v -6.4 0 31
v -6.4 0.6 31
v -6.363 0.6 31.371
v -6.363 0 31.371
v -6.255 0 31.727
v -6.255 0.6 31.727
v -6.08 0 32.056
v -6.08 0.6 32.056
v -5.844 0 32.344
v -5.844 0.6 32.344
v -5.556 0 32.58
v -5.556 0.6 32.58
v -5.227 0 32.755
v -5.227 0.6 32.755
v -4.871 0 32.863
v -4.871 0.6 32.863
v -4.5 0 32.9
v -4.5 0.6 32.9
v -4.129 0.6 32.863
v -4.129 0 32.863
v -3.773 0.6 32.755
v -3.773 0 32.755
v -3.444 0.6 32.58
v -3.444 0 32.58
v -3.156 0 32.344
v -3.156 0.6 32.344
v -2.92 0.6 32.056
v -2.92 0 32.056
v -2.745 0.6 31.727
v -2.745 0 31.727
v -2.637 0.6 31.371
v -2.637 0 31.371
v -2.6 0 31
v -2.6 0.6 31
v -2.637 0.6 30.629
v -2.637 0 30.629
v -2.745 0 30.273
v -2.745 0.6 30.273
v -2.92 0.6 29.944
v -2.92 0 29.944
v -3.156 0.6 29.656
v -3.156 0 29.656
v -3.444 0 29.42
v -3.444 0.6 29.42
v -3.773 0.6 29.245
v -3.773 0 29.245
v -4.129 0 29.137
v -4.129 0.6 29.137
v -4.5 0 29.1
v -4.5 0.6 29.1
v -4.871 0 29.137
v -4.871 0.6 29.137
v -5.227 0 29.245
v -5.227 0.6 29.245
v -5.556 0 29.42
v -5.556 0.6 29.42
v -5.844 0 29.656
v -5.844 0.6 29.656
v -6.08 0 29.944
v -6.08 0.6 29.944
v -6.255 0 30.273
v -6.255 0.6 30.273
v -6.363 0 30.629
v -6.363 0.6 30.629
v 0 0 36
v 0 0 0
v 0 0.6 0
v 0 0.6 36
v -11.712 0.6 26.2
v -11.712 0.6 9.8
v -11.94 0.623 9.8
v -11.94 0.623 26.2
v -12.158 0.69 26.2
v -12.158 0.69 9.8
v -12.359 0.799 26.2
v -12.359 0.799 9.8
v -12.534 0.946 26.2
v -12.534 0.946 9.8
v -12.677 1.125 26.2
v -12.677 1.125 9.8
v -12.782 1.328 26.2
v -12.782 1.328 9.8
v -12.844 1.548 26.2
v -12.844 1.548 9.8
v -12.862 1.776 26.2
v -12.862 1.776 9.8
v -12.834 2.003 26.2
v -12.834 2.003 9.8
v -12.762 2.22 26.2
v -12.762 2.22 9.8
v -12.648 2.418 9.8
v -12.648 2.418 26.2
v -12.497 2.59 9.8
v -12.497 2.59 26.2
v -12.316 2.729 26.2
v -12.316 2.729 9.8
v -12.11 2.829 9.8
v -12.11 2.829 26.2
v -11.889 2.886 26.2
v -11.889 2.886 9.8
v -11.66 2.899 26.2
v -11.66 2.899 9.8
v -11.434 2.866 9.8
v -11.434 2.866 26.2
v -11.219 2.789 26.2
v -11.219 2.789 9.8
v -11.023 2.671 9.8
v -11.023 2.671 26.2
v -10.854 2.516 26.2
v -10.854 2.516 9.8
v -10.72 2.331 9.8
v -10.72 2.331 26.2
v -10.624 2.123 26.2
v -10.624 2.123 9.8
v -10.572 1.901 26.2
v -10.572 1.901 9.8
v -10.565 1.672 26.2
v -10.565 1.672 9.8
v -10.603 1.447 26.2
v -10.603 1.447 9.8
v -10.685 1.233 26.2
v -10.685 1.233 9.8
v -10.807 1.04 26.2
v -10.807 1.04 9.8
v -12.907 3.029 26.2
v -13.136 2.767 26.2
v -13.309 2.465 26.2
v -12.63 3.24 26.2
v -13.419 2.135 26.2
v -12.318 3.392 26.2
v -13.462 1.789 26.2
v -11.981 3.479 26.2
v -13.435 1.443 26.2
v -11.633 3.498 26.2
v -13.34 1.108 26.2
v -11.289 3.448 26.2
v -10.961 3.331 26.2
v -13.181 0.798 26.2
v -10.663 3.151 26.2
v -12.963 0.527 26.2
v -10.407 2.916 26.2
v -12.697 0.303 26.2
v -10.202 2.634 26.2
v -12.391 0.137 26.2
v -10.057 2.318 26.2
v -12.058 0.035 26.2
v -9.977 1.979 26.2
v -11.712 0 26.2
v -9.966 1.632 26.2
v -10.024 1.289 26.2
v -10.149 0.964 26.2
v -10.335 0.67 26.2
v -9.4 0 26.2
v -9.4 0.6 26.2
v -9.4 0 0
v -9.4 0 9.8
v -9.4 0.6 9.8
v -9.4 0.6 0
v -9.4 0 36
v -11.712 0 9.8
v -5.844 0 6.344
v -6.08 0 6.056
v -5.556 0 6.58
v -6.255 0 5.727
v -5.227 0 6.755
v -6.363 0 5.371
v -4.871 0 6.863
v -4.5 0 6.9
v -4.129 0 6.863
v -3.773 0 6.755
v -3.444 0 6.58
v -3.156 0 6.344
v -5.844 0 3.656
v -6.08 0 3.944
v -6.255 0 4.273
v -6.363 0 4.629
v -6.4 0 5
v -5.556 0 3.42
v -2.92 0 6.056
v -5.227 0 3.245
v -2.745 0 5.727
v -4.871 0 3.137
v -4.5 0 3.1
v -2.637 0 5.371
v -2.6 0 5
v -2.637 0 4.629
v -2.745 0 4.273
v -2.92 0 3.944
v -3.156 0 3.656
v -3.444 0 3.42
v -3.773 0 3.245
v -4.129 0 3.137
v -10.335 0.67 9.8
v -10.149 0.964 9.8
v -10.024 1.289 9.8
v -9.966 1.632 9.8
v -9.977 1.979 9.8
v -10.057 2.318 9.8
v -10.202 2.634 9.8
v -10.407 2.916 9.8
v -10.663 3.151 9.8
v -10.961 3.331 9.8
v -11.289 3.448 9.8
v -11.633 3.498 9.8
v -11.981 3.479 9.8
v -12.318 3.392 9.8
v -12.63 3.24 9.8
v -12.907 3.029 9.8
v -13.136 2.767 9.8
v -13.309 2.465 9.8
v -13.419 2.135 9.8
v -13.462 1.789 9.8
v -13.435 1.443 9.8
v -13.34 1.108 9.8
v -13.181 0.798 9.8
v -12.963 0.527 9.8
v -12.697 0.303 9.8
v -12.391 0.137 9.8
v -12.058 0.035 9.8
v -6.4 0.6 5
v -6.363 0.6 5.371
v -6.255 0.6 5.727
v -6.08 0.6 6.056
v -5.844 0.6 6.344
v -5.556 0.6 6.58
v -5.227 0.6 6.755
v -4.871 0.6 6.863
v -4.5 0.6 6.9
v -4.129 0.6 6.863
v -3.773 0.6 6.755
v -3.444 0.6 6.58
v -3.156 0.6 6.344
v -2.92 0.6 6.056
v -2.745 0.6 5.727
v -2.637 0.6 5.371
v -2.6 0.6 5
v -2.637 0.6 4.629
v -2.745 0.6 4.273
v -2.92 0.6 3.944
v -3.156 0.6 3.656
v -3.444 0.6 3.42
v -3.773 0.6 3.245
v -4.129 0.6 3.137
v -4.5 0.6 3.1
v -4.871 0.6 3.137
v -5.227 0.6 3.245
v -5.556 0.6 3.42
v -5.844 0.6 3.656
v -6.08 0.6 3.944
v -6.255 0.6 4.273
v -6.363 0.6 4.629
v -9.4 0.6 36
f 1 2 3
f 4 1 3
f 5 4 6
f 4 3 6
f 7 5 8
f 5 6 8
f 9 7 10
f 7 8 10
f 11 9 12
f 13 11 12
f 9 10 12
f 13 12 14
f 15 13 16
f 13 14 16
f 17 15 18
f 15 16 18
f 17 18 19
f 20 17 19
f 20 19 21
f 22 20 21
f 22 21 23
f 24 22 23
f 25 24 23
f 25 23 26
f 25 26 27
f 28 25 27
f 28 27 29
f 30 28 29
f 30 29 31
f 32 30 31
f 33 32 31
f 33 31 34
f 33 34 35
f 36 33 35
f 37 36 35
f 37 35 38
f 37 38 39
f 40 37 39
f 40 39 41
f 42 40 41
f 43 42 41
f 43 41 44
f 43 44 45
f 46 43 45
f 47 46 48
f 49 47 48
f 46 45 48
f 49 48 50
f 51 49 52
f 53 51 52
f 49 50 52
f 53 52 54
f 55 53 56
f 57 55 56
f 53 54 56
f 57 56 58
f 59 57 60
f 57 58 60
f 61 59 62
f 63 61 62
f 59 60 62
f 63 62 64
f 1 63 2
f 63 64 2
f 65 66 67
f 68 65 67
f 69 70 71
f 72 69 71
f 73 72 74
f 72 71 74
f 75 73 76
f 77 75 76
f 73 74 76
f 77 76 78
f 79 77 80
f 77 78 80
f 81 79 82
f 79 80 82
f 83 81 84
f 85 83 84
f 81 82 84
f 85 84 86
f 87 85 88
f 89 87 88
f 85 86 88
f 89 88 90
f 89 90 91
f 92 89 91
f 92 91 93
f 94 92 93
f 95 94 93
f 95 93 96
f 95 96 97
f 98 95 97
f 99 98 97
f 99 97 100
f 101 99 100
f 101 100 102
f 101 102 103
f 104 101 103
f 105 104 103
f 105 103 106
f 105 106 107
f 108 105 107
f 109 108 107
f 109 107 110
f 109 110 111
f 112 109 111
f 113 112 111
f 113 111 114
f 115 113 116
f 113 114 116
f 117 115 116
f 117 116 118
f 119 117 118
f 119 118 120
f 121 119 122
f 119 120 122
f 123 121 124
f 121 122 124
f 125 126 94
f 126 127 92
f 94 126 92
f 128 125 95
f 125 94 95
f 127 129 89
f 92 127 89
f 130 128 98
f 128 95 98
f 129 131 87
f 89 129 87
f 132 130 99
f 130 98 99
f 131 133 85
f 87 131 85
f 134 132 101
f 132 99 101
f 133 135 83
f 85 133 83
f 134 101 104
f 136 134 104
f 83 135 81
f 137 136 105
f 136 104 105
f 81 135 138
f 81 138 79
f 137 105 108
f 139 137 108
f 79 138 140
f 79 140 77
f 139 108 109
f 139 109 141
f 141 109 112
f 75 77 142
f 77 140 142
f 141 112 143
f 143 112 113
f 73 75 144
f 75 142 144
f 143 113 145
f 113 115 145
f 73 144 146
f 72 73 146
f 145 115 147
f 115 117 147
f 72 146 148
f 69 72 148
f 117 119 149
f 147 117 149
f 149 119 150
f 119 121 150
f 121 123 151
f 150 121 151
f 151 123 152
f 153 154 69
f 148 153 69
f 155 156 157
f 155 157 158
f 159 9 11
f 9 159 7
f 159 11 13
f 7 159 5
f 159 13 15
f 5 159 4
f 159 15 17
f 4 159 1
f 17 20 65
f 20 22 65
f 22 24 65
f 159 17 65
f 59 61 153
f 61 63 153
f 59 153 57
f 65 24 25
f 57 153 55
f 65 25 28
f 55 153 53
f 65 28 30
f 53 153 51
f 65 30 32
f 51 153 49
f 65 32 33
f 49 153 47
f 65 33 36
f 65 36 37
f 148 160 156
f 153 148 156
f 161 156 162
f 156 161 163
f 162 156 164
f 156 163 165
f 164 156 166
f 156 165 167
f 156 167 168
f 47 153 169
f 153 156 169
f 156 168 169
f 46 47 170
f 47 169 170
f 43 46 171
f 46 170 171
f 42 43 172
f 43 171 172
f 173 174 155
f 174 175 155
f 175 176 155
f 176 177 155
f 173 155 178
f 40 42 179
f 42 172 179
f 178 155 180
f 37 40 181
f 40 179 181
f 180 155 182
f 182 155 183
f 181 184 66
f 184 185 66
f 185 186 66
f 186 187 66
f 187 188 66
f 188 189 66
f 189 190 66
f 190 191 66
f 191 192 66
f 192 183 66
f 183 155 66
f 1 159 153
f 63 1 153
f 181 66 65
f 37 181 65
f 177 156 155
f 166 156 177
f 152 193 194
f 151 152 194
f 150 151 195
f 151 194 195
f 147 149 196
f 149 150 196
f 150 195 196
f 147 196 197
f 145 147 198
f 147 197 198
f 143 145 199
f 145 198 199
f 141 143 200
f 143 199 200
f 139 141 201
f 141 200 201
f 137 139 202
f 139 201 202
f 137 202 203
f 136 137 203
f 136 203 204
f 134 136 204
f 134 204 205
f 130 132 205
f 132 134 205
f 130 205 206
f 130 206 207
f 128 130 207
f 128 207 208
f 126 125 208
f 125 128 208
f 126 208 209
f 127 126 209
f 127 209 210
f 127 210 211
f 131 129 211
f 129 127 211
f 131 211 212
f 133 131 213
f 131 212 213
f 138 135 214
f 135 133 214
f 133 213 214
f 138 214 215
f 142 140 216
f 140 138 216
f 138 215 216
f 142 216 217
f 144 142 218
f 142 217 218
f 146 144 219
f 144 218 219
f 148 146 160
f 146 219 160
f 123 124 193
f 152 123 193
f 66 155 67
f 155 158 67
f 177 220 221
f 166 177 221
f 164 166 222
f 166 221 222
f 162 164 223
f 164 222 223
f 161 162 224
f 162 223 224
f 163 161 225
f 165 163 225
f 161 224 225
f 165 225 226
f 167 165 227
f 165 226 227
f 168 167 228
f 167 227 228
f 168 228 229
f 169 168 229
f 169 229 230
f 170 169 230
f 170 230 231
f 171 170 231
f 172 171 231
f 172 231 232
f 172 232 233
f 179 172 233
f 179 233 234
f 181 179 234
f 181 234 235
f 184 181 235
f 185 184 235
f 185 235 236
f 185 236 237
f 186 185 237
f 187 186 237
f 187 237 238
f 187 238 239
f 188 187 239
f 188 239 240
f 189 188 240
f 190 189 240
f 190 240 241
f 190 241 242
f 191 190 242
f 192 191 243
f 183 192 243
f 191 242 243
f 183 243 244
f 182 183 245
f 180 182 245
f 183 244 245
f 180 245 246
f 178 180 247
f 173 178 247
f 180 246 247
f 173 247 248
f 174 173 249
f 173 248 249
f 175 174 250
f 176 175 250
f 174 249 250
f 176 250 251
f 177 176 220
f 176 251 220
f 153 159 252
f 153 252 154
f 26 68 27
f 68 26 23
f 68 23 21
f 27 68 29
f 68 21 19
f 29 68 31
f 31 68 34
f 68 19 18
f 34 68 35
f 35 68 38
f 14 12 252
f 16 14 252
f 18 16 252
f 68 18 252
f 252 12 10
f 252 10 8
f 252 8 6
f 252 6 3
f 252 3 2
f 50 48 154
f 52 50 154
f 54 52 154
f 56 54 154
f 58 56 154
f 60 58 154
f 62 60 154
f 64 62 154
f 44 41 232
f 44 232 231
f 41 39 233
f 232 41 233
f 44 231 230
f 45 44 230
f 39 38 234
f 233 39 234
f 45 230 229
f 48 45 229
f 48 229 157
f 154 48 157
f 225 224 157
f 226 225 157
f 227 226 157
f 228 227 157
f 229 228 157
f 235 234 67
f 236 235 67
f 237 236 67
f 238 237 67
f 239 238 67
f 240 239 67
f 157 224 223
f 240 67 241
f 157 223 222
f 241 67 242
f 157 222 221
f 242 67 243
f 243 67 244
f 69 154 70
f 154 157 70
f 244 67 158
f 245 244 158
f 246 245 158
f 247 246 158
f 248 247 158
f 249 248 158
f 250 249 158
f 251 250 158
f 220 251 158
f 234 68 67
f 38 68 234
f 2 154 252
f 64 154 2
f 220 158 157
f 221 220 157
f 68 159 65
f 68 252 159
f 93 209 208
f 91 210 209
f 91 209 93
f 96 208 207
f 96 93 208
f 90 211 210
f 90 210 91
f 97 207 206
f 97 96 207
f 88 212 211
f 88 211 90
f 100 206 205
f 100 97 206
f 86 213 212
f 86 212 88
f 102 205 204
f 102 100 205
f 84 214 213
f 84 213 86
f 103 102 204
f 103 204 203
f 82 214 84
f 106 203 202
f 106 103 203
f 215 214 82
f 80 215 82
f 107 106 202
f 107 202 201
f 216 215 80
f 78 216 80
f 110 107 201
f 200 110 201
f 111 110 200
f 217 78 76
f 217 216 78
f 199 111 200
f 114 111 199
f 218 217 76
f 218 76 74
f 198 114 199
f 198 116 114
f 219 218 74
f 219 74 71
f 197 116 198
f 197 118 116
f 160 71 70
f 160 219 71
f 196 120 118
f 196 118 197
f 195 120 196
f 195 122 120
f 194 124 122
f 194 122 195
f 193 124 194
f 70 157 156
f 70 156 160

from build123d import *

# Parameters (mm, degrees)
BOSS_EXTRUDE1_DEPTH     = 36
SKETCH2_R               = 1.9
CUT_EXTRUDE1_DEPTH      = 39.543989963
CUT_EXTRUDE2_DEPTH      = 39.543989963
CUT_EXTRUDE2_DEPTH_BACK = 39.543989963
SKETCH3_W               = 6.778348146
SKETCH3_H               = 10.807071142
SKETCH3_W_2             = 8.880524156
SKETCH3_H_2             = 10.732304286


with BuildPart() as part:
    # Sketch1 → Boss-Extrude1 (new body)
    with BuildSketch(Plane.XY):
        with BuildLine():
            Line((0, 0), (0, 0.6))
            Line((0, 0.6), (-11.712138102, 0.6))
            ThreePointArc((-11.712138102, 0.6), (-12.215259426, 2.784102961), (-10.807304622, 1.040227943))
            Line((-10.807304622, 1.040227943), (-10.335217589, 0.669912086))
            ThreePointArc((-10.335217589, 0.669912086), (-12.477757508, 3.32363494), (-11.712138102, 0))
            Line((-11.712138102, 0), (0, 0))
        make_face()
    extrude(amount=BOSS_EXTRUDE1_DEPTH)

    # Sketch2 → Cut-Extrude1 (cut, through all)
    with BuildSketch(Plane(origin=(0, 0.6, 0), x_dir=(1, 0, 0), z_dir=(0, 1, 0))):
        with Locations(Location((-4.5, -5, 0), (0, 0, 180))):
            Circle(SKETCH2_R)
        with Locations(Location((-4.5, -31, 0), (0, 0, 180))):
            Circle(SKETCH2_R)
    extrude(amount=-CUT_EXTRUDE1_DEPTH, mode=Mode.SUBTRACT)

    # Sketch3 → Cut-Extrude2 (cut, two sides: drawn at the far end of the back side and taken through both)
    with BuildSketch(Plane(origin=(0, 0.6, 0), x_dir=(1, 0, 0), z_dir=(0, 1, 0)).offset(-CUT_EXTRUDE2_DEPTH_BACK)):
        with Locations((-12.789174073, -4.396464429)):
            Rectangle(SKETCH3_W, SKETCH3_H)
        with Locations((-13.840262078, -31.566152143)):
            Rectangle(SKETCH3_W_2, SKETCH3_H_2)
    extrude(amount=CUT_EXTRUDE2_DEPTH + CUT_EXTRUDE2_DEPTH_BACK, mode=Mode.SUBTRACT)


solid = part.part
